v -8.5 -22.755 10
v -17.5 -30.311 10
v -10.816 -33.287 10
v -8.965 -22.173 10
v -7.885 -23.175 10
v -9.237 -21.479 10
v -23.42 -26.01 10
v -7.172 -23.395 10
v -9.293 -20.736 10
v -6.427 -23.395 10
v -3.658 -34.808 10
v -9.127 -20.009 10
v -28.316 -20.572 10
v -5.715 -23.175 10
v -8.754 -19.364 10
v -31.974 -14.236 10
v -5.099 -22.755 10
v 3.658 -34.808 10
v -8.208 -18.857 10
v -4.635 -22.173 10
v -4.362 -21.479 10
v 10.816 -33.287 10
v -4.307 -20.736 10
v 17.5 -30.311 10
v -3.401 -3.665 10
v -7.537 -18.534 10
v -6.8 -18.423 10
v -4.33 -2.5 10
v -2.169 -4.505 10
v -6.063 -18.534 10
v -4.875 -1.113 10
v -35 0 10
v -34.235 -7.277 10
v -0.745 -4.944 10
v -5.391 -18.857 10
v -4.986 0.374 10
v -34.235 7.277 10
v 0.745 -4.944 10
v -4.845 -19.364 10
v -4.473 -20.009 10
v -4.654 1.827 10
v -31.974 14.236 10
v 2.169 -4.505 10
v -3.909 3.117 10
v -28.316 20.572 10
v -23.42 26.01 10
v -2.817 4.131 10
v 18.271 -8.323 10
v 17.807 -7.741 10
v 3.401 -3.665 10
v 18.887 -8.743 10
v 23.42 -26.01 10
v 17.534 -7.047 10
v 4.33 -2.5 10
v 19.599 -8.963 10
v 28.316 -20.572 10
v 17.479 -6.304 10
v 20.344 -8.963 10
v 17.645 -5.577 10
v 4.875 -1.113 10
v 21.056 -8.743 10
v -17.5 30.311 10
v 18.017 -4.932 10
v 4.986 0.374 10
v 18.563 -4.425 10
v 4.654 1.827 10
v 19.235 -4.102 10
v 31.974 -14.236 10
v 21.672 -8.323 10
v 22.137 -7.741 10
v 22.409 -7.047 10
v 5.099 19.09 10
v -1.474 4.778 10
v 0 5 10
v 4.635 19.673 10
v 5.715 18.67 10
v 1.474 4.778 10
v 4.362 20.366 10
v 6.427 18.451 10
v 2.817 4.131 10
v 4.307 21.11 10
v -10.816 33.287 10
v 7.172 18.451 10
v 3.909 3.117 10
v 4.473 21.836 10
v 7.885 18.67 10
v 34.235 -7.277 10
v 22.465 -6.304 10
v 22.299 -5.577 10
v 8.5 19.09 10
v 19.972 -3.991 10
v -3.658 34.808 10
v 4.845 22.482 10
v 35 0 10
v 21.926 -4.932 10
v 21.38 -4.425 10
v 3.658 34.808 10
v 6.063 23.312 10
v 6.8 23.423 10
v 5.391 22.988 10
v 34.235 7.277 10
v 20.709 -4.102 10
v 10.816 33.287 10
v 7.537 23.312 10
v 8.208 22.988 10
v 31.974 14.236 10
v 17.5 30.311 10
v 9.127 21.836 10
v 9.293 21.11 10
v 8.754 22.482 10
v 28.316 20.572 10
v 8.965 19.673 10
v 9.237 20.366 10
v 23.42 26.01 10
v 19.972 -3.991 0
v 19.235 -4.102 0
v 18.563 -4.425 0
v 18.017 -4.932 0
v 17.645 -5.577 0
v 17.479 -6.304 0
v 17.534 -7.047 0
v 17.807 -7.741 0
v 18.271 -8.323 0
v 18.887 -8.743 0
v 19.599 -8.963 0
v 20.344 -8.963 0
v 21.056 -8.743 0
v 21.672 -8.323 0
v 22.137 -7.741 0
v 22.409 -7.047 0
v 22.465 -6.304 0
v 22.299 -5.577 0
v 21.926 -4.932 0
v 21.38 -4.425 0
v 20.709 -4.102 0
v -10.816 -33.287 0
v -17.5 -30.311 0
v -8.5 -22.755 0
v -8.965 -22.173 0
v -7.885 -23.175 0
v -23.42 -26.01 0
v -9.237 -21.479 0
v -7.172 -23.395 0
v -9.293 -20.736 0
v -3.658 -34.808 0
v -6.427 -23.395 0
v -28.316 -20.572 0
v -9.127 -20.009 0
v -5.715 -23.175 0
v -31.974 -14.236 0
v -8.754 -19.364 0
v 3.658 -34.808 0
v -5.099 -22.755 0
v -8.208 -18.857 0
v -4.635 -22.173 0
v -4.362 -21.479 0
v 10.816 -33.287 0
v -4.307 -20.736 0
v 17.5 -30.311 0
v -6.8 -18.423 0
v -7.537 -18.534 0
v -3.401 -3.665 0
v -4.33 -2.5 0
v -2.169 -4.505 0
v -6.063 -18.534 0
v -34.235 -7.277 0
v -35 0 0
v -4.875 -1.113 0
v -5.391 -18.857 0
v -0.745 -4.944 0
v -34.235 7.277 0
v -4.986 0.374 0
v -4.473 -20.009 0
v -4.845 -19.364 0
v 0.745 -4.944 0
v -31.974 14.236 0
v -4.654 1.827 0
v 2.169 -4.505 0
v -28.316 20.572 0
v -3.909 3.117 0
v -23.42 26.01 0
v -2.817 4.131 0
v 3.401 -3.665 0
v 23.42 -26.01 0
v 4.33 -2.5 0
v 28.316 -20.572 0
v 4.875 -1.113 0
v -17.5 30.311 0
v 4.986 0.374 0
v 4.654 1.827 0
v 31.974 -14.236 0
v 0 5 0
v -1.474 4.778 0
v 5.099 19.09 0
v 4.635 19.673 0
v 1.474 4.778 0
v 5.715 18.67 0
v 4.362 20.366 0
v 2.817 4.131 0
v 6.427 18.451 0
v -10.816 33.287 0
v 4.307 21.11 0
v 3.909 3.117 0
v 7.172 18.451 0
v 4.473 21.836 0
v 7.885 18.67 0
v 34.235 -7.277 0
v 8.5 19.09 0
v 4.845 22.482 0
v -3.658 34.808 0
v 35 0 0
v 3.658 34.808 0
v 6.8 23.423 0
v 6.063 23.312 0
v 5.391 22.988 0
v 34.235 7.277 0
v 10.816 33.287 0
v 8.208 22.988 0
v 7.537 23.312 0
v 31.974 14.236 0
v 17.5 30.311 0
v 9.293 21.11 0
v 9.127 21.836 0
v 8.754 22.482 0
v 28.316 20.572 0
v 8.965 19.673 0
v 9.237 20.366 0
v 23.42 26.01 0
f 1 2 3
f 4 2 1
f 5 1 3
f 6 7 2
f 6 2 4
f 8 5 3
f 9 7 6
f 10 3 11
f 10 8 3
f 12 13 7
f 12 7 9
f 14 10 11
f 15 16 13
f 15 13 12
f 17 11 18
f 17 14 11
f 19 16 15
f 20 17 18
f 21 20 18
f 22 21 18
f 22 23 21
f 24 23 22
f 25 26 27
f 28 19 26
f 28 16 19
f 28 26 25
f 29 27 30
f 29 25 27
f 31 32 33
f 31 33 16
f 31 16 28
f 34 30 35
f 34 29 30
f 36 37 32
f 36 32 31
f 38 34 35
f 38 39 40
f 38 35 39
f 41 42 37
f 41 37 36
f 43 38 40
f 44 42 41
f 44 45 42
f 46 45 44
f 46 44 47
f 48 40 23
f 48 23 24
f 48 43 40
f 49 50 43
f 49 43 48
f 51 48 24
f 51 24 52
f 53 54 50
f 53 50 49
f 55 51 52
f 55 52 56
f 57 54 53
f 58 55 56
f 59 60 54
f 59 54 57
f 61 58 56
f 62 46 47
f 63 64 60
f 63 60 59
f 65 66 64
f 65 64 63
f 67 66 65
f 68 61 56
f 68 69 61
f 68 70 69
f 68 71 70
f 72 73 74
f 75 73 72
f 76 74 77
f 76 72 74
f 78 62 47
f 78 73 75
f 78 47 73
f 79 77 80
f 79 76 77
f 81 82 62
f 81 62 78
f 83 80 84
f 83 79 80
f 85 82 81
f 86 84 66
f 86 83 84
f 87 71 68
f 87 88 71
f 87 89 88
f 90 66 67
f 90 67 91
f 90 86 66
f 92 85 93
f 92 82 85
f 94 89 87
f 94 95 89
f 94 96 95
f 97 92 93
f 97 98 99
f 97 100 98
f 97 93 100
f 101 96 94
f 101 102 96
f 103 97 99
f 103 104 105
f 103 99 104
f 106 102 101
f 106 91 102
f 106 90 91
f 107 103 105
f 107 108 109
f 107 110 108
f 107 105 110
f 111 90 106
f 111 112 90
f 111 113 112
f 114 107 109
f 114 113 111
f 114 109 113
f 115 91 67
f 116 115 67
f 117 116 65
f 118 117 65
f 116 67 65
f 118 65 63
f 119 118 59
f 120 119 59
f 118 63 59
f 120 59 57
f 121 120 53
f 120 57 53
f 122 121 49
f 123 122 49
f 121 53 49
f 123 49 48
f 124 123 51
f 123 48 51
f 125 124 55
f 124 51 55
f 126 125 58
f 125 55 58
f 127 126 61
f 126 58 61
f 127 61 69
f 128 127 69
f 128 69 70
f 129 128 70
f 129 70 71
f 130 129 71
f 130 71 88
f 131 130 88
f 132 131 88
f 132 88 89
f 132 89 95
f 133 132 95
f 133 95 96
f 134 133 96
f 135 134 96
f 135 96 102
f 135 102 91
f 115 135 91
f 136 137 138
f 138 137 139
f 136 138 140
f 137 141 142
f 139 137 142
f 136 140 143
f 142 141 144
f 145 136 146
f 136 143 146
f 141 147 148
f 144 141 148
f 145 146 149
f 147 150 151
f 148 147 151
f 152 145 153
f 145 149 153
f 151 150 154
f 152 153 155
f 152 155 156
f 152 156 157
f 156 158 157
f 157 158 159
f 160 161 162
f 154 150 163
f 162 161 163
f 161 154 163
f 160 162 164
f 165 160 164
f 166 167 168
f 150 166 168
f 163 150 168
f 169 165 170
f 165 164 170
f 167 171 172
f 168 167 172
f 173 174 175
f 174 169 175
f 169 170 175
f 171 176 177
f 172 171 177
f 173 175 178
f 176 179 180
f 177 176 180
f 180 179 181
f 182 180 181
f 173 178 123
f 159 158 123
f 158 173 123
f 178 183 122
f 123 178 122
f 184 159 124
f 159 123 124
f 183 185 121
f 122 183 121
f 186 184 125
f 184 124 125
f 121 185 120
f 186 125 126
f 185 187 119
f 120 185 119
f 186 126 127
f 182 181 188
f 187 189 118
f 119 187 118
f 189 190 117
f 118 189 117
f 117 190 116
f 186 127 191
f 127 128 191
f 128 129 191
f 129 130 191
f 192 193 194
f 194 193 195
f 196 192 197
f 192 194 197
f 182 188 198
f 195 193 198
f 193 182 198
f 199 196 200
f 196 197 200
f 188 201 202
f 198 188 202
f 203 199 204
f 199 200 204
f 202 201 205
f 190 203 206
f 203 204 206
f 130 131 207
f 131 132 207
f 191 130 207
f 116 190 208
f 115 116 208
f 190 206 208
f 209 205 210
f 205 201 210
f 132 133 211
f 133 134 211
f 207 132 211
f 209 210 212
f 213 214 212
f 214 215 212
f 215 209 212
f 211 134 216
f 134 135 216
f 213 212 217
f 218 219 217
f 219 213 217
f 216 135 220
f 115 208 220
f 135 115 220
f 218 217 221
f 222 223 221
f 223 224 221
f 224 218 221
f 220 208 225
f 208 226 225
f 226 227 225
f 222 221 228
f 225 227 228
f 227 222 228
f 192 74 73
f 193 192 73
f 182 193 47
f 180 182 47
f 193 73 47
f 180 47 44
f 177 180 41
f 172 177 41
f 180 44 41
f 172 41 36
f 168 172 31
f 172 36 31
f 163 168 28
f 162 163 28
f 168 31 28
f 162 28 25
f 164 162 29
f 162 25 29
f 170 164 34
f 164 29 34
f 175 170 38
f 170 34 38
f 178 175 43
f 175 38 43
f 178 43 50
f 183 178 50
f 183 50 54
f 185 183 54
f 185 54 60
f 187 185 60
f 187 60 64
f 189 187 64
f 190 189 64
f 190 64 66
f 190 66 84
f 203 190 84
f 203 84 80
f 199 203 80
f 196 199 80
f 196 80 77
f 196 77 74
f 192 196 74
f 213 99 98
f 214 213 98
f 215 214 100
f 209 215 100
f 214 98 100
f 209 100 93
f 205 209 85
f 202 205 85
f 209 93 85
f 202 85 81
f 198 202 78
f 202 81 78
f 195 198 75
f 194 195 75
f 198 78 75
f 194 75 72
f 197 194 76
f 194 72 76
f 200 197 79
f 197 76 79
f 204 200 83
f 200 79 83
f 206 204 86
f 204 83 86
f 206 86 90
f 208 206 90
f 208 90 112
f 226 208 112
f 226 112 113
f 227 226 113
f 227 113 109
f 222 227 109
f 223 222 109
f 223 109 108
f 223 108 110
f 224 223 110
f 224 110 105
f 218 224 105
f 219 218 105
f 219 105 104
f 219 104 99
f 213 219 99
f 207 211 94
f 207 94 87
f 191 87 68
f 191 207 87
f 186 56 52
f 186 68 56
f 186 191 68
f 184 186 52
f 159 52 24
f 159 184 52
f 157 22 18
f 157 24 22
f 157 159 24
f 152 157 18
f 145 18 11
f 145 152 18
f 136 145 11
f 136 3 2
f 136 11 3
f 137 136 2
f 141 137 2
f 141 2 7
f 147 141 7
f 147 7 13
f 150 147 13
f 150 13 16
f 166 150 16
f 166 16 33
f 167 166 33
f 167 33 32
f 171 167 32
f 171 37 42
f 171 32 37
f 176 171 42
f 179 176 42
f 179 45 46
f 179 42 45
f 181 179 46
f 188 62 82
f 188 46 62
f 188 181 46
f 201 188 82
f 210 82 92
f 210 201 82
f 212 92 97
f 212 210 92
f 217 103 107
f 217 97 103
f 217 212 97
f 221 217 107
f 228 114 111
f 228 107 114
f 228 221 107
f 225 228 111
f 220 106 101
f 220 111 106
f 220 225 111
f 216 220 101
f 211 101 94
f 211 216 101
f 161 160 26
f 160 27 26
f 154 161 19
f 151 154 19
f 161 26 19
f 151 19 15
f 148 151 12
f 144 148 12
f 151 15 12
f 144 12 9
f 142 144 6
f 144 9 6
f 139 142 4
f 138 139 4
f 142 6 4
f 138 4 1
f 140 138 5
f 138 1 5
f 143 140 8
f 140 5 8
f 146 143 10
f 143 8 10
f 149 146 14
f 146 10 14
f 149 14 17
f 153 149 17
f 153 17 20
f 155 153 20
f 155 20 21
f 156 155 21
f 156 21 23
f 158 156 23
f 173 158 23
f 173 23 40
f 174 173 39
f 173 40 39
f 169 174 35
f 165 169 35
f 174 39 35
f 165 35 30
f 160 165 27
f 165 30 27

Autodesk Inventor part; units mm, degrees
ref_plane "YZ Plane" through (0, 0, 0) normal (1, 0, 0) x (0, 1, 0)
ref_plane "XZ Plane" through (0, 0, 0) normal (0, 1, 0) x (-1, 0, 0)
ref_plane "XY Plane" through (0, 0, 0) normal (0, 0, 1) x (1, 0, 0)
sketch "Sketch1" plane through (0, 0, 0) normal (0, 0, 1) x (1, 0, 0)
  circle A0 centre (0, 0) radius 35
  dimension "d4" = 70
extrude "Extrusion1" add sketch "Sketch1" along normal blind 10
sketch "Sketch2" plane through (0, 0, 0) normal (0, 0, -1) x (-1, 0, 0)
  circle A0 centre (19.9717, 6.4907) radius 2.5 projected
  circle A1 centre (6.7998, -20.9228) radius 2.5 projected
  circle A2 centre (-19.9717, -6.4907) radius 2.5 projected
  circle A3 centre (-6.7998, 20.9228) radius 2.5 projected
sketch3d "3D Sketch1"
hole "Hole2" at (0, 0, 0) direction (0, 0, 1) diameter 10 end through all
hole "Hole5" at (6.7998, 20.9228, 0) at (19.9717, -6.4907, 0) at (-6.7998, -20.9228, 0) direction (0, 0, 1) diameter 5 end through all
properties part number "Plate"
